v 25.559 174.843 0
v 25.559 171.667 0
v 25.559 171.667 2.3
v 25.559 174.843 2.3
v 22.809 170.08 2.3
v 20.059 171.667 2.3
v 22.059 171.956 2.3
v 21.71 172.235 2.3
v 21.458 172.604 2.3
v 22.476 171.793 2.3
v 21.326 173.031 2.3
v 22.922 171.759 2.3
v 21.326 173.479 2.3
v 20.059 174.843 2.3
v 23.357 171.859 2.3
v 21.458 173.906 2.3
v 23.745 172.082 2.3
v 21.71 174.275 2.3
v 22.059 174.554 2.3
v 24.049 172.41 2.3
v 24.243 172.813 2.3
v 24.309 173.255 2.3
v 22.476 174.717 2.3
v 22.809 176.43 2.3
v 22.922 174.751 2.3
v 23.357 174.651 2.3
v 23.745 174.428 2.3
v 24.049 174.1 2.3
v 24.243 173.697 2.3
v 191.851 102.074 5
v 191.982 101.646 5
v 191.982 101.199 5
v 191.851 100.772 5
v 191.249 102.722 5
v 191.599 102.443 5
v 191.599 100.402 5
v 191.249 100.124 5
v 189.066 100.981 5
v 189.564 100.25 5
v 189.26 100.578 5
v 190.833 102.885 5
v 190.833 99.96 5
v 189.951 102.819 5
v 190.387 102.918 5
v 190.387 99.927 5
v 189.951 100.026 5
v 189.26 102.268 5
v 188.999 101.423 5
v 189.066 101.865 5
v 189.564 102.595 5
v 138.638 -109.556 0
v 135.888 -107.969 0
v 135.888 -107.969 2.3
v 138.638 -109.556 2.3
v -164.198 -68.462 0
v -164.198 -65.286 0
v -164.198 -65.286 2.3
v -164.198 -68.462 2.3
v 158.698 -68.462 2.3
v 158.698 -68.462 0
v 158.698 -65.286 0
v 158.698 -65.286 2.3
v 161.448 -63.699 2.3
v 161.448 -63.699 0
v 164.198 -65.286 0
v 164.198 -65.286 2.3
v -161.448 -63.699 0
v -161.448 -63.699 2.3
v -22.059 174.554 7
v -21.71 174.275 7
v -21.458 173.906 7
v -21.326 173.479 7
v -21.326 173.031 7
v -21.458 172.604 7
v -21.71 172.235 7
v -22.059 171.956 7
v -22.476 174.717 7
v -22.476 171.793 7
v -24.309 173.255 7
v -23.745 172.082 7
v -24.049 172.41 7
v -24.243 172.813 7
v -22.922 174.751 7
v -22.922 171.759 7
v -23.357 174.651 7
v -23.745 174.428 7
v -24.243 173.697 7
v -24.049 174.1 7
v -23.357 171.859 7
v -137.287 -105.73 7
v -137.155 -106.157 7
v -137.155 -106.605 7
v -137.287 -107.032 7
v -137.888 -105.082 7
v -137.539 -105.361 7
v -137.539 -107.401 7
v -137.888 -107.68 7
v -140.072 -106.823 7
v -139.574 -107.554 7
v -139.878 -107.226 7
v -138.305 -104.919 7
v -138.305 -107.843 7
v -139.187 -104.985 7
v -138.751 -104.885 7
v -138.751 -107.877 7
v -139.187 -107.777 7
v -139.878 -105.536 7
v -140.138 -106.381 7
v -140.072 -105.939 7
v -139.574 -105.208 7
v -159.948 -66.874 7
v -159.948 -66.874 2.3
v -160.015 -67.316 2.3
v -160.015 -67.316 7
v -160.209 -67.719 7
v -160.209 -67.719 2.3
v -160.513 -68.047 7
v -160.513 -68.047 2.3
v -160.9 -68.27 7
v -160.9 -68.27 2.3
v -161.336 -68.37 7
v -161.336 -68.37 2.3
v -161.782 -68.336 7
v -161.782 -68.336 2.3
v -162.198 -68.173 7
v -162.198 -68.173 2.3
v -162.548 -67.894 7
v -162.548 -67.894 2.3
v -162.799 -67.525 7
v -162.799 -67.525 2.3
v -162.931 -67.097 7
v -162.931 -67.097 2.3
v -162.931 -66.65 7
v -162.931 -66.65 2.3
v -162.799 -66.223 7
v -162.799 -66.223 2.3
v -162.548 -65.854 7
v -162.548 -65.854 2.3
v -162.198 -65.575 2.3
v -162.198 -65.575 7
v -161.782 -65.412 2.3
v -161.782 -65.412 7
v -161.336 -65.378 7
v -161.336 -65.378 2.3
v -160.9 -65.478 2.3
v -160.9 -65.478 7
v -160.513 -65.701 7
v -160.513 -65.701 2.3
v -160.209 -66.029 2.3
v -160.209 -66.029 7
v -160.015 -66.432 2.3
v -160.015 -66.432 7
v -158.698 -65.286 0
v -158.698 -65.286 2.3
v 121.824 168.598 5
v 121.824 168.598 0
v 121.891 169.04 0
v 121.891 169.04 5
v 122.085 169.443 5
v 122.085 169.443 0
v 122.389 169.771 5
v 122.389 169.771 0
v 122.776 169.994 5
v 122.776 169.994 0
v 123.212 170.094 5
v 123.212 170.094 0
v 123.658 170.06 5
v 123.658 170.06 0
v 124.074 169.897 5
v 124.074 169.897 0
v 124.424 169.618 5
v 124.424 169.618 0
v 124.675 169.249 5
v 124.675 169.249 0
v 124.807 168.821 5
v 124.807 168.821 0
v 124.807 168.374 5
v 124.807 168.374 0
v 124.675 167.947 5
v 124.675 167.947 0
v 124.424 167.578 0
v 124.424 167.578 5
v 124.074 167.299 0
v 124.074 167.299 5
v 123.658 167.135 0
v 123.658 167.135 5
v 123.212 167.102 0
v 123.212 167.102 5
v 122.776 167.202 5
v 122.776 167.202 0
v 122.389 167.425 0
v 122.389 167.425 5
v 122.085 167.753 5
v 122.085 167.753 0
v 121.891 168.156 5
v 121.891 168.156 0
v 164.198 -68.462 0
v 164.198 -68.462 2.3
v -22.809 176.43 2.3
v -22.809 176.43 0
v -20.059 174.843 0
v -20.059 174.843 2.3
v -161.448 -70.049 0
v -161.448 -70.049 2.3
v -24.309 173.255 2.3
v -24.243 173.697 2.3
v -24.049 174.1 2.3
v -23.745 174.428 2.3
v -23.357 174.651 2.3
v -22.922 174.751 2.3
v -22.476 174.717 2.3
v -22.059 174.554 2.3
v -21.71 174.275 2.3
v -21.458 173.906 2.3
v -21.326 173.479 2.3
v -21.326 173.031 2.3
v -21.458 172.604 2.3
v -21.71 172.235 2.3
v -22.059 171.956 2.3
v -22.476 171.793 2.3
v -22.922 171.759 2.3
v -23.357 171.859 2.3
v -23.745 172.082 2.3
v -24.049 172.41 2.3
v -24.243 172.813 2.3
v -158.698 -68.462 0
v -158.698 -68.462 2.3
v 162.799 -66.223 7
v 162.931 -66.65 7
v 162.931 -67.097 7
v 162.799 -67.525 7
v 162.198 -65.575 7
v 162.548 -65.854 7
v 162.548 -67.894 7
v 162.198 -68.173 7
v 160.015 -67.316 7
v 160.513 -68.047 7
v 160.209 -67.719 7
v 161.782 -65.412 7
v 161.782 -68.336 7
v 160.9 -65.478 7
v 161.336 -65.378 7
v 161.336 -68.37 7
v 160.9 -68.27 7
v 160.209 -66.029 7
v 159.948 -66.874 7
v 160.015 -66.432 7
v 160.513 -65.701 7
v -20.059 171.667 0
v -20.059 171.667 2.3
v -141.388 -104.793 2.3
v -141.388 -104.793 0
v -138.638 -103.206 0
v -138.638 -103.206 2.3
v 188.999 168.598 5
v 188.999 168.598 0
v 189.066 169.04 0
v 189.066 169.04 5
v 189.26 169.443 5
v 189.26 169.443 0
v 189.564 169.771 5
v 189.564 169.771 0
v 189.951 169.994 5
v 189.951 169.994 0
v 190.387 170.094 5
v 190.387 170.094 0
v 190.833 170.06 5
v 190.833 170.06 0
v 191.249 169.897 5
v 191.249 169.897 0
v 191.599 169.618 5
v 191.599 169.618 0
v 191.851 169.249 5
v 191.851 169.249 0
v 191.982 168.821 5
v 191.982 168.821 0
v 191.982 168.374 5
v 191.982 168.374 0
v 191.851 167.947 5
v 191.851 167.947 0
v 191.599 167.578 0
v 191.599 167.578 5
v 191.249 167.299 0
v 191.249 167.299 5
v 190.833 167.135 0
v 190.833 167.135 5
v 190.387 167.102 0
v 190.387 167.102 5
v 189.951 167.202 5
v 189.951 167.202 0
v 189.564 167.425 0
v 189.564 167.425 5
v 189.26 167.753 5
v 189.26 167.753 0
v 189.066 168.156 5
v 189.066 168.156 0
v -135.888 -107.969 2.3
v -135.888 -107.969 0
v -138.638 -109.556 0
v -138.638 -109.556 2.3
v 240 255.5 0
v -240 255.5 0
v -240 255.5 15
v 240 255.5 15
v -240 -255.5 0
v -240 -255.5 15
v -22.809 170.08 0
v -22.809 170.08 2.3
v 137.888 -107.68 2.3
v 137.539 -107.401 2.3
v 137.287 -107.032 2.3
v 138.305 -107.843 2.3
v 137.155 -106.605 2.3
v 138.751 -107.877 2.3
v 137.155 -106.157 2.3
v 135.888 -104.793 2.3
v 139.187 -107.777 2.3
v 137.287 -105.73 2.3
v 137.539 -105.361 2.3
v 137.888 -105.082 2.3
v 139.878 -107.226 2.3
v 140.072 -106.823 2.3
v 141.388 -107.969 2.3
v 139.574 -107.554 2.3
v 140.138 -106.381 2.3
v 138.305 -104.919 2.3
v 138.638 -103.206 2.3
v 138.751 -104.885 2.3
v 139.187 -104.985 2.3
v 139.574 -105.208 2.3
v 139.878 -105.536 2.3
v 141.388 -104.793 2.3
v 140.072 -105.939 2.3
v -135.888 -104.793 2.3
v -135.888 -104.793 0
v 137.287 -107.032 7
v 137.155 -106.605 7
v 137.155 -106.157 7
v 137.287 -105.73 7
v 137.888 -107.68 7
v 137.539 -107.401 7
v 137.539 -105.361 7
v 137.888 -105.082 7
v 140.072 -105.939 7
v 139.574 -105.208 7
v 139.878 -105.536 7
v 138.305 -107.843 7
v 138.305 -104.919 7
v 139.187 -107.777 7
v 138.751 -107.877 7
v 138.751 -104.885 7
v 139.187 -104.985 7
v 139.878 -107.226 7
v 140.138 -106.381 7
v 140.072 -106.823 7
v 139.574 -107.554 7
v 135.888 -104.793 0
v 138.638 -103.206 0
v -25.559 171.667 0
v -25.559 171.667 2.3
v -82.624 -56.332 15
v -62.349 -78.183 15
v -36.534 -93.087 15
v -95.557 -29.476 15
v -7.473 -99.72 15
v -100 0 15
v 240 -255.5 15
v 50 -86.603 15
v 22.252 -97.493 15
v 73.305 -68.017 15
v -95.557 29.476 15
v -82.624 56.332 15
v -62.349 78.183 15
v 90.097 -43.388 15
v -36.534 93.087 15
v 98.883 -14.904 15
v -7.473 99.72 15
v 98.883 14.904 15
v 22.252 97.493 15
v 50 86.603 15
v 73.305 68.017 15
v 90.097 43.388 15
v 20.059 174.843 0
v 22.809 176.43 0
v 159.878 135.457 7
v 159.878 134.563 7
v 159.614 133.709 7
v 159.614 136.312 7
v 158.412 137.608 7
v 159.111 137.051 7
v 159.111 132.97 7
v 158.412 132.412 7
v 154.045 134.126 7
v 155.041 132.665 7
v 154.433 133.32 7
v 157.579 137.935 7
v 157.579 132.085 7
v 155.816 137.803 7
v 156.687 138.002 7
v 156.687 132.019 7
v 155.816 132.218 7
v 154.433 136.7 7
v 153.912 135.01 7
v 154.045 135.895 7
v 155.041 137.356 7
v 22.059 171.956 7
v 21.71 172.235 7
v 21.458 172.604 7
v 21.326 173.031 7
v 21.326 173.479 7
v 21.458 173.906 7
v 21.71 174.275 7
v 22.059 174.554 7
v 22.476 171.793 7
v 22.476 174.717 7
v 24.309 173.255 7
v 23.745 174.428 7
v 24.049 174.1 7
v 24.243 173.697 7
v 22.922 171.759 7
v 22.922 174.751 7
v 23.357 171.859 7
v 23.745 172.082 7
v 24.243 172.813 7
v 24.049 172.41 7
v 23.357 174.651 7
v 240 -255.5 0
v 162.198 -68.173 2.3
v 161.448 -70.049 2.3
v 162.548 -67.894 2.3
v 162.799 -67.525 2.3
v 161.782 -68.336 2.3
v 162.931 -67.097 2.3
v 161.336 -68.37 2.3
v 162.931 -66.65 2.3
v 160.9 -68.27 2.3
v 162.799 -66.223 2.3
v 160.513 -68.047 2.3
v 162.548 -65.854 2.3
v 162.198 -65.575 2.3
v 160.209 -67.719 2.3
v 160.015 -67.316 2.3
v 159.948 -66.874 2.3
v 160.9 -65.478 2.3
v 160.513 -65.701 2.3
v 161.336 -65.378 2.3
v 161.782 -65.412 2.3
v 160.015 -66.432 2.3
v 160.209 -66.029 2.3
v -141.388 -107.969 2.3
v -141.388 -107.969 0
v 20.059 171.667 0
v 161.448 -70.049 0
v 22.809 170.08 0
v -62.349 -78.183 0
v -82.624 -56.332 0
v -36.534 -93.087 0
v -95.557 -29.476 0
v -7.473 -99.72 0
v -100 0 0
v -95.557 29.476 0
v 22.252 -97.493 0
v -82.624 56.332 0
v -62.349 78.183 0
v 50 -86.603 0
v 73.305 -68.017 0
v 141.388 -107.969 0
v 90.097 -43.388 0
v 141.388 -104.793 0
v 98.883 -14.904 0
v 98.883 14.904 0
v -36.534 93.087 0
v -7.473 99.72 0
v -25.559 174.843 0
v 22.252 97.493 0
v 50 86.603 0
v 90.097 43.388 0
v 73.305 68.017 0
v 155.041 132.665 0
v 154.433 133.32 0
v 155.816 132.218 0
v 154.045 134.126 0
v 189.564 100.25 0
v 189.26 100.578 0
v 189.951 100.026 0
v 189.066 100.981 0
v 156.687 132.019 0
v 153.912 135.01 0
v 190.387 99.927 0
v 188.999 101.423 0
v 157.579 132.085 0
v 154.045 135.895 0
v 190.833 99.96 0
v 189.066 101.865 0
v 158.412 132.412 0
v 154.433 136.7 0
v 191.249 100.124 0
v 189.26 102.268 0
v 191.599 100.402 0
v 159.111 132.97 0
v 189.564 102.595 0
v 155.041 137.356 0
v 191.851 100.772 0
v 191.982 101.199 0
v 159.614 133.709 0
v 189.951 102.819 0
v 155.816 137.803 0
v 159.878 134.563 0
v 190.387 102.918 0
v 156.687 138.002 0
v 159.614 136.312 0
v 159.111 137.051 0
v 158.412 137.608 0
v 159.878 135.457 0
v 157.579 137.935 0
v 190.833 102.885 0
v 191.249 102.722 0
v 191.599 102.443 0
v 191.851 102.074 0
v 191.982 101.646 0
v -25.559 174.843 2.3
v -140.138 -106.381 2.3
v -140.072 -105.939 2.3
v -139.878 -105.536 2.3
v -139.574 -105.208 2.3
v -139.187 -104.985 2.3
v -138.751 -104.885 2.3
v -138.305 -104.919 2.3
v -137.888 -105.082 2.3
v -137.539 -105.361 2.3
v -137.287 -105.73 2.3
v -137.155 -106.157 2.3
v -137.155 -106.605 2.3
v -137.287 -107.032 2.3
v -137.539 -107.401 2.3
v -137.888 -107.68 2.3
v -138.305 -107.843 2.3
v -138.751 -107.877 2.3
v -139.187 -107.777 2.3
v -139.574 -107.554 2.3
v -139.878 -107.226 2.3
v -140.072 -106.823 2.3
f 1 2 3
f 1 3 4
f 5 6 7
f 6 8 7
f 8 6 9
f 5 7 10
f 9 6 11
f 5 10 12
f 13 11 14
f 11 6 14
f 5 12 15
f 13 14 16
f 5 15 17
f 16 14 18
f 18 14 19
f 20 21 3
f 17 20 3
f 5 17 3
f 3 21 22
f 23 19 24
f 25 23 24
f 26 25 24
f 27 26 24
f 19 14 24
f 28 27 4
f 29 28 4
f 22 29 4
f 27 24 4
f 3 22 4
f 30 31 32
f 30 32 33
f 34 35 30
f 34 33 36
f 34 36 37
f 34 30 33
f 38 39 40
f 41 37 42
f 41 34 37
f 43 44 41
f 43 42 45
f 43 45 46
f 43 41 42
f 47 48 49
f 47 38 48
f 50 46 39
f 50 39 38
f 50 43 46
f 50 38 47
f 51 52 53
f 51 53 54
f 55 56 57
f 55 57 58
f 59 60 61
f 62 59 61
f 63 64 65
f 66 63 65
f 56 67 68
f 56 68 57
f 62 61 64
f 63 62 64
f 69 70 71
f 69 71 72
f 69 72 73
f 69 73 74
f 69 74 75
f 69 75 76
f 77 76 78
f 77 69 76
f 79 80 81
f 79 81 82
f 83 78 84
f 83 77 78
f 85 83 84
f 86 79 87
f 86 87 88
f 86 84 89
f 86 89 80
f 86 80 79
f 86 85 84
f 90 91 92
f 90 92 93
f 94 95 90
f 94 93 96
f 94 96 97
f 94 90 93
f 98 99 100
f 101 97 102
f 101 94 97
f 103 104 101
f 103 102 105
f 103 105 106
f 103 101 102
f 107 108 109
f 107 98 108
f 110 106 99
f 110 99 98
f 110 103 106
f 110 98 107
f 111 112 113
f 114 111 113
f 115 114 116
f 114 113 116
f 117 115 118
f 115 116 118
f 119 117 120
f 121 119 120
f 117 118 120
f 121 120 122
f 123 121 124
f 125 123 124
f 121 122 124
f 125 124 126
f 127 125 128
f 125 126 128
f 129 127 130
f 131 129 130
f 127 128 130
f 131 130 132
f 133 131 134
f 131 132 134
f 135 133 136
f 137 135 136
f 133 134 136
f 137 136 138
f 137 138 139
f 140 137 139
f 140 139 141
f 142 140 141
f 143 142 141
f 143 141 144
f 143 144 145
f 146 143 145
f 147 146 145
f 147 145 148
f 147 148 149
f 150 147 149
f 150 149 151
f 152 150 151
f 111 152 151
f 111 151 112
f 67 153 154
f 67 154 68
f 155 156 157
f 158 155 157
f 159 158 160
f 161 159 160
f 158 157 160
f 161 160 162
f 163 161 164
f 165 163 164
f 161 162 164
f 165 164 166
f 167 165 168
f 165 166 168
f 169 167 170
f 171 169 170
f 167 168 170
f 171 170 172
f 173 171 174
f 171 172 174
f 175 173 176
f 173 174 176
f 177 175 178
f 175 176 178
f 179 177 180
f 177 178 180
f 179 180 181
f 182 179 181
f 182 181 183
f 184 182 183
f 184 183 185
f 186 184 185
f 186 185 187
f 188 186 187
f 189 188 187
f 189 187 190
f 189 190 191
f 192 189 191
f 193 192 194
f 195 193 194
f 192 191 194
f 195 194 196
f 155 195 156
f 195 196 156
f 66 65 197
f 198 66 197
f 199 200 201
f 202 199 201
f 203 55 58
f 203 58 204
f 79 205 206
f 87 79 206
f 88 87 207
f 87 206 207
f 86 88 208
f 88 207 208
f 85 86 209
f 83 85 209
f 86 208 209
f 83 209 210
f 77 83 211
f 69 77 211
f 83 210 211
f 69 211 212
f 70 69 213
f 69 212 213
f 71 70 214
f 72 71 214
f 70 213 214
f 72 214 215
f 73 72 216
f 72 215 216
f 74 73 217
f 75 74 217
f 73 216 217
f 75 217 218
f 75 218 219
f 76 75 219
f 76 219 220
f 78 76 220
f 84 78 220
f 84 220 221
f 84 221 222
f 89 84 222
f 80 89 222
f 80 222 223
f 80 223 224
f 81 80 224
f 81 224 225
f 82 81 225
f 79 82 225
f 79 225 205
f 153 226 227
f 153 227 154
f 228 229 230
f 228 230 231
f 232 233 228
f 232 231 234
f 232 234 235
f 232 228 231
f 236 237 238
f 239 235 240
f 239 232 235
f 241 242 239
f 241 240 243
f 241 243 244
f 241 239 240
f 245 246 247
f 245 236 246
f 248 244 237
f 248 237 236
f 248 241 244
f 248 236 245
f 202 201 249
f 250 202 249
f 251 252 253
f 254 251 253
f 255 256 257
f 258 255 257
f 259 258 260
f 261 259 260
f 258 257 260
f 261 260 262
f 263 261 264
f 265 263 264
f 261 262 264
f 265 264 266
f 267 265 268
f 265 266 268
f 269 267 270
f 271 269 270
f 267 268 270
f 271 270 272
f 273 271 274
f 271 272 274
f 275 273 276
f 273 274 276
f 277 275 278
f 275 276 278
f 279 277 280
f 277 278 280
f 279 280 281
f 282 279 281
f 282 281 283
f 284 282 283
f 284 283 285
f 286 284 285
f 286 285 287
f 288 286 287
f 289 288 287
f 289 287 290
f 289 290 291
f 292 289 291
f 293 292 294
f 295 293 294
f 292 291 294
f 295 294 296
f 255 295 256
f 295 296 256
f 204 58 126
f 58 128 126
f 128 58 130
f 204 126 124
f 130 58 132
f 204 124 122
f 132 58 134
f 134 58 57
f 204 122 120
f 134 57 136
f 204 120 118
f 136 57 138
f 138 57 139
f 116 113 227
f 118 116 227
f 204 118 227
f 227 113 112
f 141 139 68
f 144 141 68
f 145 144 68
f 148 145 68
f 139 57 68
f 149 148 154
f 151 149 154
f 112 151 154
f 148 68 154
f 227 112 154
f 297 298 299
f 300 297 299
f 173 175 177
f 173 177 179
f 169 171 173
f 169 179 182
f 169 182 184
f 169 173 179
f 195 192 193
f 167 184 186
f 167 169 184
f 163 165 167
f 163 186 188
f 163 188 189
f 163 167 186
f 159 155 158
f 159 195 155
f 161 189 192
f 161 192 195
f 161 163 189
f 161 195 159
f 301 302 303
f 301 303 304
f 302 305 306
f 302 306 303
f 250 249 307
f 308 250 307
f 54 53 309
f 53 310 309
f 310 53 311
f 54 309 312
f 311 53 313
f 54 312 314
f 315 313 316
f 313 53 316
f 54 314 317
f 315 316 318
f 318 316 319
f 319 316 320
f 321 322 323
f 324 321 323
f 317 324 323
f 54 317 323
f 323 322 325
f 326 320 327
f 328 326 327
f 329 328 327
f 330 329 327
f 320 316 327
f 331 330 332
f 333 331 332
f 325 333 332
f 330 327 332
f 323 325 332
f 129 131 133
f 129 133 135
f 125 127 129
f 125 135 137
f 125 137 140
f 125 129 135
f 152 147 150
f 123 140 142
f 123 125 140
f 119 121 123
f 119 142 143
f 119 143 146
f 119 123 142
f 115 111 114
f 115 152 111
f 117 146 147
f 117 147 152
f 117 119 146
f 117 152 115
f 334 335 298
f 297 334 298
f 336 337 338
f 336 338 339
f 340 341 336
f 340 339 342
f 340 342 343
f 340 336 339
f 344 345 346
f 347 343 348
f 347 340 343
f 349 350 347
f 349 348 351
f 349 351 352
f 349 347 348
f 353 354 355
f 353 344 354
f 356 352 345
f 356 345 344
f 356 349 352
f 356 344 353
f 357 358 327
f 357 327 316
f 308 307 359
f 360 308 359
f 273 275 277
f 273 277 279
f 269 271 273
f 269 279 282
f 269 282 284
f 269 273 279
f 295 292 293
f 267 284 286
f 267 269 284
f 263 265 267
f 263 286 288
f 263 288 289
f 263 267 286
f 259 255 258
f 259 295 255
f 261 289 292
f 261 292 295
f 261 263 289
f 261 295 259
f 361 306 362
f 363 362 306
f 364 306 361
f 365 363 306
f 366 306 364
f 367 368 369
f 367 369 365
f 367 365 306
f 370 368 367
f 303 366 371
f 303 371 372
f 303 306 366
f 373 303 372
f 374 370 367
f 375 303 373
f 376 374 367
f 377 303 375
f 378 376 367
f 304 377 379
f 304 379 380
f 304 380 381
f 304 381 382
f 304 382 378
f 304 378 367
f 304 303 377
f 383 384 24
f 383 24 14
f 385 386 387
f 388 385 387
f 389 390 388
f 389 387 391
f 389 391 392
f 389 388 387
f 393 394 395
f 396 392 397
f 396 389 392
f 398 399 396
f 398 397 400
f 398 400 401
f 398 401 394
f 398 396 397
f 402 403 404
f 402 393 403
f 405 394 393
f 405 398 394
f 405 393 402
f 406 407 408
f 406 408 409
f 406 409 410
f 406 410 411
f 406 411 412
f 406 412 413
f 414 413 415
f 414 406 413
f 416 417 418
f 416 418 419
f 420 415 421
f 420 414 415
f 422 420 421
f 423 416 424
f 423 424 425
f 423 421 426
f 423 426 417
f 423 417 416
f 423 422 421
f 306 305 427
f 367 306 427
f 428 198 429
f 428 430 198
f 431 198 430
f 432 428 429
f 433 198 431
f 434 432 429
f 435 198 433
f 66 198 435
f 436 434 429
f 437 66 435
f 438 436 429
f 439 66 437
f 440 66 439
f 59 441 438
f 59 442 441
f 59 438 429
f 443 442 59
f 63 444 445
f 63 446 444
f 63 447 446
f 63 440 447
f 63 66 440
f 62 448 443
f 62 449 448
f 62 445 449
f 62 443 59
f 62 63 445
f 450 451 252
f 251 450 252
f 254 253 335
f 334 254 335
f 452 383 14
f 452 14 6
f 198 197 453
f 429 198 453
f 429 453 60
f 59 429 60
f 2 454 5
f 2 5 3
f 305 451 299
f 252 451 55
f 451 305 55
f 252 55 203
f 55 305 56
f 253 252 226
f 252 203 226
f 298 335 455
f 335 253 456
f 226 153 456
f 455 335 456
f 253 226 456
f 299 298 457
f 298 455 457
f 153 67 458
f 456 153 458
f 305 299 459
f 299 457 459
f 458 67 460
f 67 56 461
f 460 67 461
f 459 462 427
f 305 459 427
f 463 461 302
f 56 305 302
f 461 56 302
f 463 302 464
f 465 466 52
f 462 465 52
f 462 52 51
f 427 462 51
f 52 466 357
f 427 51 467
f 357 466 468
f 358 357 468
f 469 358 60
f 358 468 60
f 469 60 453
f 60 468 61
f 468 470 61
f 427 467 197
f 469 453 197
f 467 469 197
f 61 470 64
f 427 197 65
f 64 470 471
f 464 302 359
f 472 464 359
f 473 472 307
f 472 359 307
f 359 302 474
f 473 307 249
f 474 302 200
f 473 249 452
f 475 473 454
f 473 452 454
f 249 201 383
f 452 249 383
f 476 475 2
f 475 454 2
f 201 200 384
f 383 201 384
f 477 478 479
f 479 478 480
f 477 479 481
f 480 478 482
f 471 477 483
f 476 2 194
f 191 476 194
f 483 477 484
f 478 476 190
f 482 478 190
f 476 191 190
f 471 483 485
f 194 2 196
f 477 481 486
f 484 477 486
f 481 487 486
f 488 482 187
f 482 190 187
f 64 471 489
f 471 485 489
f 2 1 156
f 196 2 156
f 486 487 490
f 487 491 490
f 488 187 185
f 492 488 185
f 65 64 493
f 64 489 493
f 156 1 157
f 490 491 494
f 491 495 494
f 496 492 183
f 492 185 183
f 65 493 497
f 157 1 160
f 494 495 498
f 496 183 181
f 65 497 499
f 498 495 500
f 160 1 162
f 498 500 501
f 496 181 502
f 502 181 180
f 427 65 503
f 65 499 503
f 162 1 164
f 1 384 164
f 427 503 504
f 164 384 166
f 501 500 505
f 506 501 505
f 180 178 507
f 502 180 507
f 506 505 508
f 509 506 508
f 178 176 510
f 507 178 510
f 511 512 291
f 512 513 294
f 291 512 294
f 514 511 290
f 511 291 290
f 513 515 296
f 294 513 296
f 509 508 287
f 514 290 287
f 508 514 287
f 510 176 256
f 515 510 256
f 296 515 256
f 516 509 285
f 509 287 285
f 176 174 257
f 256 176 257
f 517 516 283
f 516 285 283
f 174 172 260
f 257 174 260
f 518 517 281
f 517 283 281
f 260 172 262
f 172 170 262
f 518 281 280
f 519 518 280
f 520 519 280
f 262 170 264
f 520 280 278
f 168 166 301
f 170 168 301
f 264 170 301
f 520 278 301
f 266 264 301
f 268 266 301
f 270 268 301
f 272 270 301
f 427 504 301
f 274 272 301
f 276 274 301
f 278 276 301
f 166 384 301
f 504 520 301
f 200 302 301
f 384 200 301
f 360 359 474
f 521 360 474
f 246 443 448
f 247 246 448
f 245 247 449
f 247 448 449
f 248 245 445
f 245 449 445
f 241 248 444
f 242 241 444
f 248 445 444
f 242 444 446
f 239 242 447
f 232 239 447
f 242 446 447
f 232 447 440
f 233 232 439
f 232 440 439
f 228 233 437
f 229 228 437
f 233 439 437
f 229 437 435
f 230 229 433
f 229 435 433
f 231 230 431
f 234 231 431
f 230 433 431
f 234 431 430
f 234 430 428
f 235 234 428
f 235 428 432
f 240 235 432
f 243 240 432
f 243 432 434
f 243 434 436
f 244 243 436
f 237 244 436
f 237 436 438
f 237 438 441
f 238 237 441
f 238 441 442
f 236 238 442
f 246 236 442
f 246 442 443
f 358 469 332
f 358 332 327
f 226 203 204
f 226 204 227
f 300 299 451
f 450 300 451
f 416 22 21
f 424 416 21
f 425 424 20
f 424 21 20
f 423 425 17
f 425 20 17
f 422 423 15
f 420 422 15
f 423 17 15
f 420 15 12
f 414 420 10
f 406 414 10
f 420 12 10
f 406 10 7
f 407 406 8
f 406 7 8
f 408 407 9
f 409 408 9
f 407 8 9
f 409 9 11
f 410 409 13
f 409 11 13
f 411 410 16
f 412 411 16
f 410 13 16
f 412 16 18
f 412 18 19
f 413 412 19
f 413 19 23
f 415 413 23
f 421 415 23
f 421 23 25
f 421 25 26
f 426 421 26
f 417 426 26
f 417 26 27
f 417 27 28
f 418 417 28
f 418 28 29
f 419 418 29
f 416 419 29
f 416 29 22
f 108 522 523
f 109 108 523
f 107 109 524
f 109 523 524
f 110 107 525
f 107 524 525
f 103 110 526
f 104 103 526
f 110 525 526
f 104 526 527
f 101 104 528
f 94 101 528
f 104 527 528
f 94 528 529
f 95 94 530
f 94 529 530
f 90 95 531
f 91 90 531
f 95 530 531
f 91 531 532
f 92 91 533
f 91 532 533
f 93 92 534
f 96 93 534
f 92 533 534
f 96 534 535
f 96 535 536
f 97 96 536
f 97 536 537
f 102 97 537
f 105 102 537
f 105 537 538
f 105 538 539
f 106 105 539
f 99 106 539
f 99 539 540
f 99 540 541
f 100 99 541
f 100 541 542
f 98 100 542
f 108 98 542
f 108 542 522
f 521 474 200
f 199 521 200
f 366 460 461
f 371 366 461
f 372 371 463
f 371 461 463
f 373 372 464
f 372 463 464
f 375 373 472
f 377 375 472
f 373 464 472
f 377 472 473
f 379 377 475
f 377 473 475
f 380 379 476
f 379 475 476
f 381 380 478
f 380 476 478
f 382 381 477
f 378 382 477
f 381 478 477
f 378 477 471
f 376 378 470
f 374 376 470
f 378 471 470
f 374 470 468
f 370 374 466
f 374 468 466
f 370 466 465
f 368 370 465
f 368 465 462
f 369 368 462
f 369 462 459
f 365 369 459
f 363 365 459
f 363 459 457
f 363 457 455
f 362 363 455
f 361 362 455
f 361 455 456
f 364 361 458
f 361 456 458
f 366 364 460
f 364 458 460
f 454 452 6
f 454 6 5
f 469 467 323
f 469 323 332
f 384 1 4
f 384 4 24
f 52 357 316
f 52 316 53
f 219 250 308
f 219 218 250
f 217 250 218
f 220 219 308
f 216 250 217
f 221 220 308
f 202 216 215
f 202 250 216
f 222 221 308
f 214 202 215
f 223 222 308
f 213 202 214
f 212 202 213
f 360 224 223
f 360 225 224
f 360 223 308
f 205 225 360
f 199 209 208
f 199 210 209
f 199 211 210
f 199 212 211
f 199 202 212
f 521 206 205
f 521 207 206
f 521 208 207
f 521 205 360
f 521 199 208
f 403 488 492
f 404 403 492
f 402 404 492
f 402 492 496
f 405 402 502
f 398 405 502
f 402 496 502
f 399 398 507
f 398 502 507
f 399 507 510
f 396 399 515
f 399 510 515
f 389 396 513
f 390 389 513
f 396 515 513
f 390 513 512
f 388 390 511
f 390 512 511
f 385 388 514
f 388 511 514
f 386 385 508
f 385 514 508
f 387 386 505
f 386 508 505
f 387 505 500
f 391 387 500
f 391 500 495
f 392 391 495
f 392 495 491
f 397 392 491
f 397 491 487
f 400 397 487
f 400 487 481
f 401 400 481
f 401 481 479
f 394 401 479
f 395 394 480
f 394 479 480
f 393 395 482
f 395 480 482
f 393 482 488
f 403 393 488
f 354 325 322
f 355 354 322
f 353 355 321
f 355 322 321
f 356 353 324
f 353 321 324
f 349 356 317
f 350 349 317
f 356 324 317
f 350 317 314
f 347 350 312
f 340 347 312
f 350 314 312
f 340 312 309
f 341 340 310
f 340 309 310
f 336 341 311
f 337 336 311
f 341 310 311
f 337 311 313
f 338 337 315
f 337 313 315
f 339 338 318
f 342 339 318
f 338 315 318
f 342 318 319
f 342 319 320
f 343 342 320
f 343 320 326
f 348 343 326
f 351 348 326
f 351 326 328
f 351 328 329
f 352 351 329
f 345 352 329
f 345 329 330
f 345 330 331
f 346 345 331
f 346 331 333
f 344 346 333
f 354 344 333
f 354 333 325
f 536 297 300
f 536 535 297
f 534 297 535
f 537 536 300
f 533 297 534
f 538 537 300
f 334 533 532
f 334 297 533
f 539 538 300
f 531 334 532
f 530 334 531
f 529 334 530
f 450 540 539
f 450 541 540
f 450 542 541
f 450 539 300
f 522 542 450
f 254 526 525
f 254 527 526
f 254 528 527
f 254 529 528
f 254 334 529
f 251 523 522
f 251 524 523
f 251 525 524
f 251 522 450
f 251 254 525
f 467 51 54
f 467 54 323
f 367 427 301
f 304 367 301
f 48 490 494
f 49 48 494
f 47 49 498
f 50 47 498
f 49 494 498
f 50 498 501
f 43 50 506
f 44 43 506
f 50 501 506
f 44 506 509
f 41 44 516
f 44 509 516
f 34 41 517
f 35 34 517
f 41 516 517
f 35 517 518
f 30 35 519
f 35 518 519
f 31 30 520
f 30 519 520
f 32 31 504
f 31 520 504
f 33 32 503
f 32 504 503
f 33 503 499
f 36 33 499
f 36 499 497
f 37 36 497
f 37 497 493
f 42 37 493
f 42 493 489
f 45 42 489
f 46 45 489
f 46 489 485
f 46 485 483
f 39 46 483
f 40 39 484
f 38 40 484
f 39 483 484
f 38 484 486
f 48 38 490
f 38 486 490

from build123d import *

# Parameters (mm, degrees)
SKETCH1_W           = 480
SKETCH1_H           = 511
BOSS_EXTRUDE1_DEPTH = 15
SKETCH3_R           = 100
CUT_EXTRUDE2_DEPTH  = 15
SKETCH4_R           = 1.5
CUT_EXTRUDE3_DEPTH  = 7
CUT_EXTRUDE4_DEPTH  = 2.3
SKETCH6_R           = 3
CUT_EXTRUDE5_DEPTH  = 7
SKETCH7_R           = 1.5
CUT_EXTRUDE6_DEPTH  = 5


with BuildPart() as part:
    # Sketch1 → Boss-Extrude1 (new body)
    with BuildSketch(Plane.XY):
        Rectangle(SKETCH1_W, SKETCH1_H)
    extrude(amount=BOSS_EXTRUDE1_DEPTH)

    # Sketch3 → Cut-Extrude2 (cut)
    with BuildSketch(Plane(origin=(0, 0, 0), x_dir=(-1, 0, 0), z_dir=(0, 0, -1))):
        Circle(SKETCH3_R)
    extrude(amount=-CUT_EXTRUDE2_DEPTH, mode=Mode.SUBTRACT)

    # Sketch4 → Cut-Extrude3 (cut)
    with BuildSketch(Plane(origin=(0, 0, 0), x_dir=(-1, 0, 0), z_dir=(0, 0, -1))):
        with Locations((22.80945209, 173.254989525)):
            Circle(SKETCH4_R)
        with Locations(Location((-22.80945209, 173.254989525, 0), (0, 0, 180))):
            Circle(SKETCH4_R)
        with Locations((-161.447948306, -66.873929806)):
            Circle(SKETCH4_R)
        with Locations(Location((-138.638496216, -106.381059719, 0), (0, 0, 180))):
            Circle(SKETCH4_R)
        with Locations((138.638496216, -106.381059719)):
            Circle(SKETCH4_R)
        with Locations(Location((161.447948306, -66.873929806, 0), (0, 0, 180))):
            Circle(SKETCH4_R)
    extrude(amount=-CUT_EXTRUDE3_DEPTH, mode=Mode.SUBTRACT)

    # Sketch5 → Cut-Extrude4 (cut)
    with BuildSketch(Plane(origin=(0, 0, 0), x_dir=(-1, 0, 0), z_dir=(0, 0, -1))):
        Polygon((22.80945209, 176.430416006), (20.05945209, 174.842702765), (20.05945209, 171.667276285), (22.80945209, 170.079563045), (25.55945209, 171.667276285), (25.55945209, 174.842702765), align=None)
        Polygon((-20.05945209, 174.842702765), (-20.05945209, 171.667276285), (-22.80945209, 170.079563045), (-25.55945209, 171.667276285), (-25.55945209, 174.842702765), (-22.80945209, 176.430416006), align=None)
        Polygon((-164.197948306, -68.461643046), (-161.447948306, -70.049356286), (-158.697948306, -68.461643046), (-158.697948306, -65.286216566), (-161.447948306, -63.698503325), (-164.197948306, -65.286216566), align=None)
        Polygon((-138.638496216, -109.5564862), (-141.388496216, -107.96877296), (-141.388496216, -104.793346479), (-138.638496216, -103.205633239), (-135.888496216, -104.793346479), (-135.888496216, -107.96877296), align=None)
        Polygon((141.388496216, -107.96877296), (141.388496216, -104.793346479), (138.638496216, -103.205633239), (135.888496216, -104.793346479), (135.888496216, -107.96877296), (138.638496216, -109.5564862), align=None)
        Polygon((164.197948306, -65.286216566), (164.197948306, -68.461643046), (161.447948306, -70.049356286), (158.697948306, -68.461643046), (158.697948306, -65.286216566), (161.447948306, -63.698503325), align=None)
    extrude(amount=-CUT_EXTRUDE4_DEPTH, mode=Mode.SUBTRACT)

    # Sketch6 → Cut-Extrude5 (cut)
    with BuildSketch(Plane(origin=(0, 0, 0), x_dir=(-1, 0, 0), z_dir=(0, 0, -1))):
        with Locations((-156.911542489, 135.010250847)):
            Circle(SKETCH6_R)
    extrude(amount=-CUT_EXTRUDE5_DEPTH, mode=Mode.SUBTRACT)

    # Sketch7 → Cut-Extrude6 (cut)
    with BuildSketch(Plane(origin=(0, 0, 0), x_dir=(-1, 0, 0), z_dir=(0, 0, -1))):
        with Locations((-123.323970382, 168.597822953)):
            Circle(SKETCH7_R)
        with Locations((-190.499114595, 168.597822953)):
            Circle(SKETCH7_R)
        with Locations((-190.499114595, 101.422678741)):
            Circle(SKETCH7_R)
    extrude(amount=-CUT_EXTRUDE6_DEPTH, mode=Mode.SUBTRACT)


solid = part.part
